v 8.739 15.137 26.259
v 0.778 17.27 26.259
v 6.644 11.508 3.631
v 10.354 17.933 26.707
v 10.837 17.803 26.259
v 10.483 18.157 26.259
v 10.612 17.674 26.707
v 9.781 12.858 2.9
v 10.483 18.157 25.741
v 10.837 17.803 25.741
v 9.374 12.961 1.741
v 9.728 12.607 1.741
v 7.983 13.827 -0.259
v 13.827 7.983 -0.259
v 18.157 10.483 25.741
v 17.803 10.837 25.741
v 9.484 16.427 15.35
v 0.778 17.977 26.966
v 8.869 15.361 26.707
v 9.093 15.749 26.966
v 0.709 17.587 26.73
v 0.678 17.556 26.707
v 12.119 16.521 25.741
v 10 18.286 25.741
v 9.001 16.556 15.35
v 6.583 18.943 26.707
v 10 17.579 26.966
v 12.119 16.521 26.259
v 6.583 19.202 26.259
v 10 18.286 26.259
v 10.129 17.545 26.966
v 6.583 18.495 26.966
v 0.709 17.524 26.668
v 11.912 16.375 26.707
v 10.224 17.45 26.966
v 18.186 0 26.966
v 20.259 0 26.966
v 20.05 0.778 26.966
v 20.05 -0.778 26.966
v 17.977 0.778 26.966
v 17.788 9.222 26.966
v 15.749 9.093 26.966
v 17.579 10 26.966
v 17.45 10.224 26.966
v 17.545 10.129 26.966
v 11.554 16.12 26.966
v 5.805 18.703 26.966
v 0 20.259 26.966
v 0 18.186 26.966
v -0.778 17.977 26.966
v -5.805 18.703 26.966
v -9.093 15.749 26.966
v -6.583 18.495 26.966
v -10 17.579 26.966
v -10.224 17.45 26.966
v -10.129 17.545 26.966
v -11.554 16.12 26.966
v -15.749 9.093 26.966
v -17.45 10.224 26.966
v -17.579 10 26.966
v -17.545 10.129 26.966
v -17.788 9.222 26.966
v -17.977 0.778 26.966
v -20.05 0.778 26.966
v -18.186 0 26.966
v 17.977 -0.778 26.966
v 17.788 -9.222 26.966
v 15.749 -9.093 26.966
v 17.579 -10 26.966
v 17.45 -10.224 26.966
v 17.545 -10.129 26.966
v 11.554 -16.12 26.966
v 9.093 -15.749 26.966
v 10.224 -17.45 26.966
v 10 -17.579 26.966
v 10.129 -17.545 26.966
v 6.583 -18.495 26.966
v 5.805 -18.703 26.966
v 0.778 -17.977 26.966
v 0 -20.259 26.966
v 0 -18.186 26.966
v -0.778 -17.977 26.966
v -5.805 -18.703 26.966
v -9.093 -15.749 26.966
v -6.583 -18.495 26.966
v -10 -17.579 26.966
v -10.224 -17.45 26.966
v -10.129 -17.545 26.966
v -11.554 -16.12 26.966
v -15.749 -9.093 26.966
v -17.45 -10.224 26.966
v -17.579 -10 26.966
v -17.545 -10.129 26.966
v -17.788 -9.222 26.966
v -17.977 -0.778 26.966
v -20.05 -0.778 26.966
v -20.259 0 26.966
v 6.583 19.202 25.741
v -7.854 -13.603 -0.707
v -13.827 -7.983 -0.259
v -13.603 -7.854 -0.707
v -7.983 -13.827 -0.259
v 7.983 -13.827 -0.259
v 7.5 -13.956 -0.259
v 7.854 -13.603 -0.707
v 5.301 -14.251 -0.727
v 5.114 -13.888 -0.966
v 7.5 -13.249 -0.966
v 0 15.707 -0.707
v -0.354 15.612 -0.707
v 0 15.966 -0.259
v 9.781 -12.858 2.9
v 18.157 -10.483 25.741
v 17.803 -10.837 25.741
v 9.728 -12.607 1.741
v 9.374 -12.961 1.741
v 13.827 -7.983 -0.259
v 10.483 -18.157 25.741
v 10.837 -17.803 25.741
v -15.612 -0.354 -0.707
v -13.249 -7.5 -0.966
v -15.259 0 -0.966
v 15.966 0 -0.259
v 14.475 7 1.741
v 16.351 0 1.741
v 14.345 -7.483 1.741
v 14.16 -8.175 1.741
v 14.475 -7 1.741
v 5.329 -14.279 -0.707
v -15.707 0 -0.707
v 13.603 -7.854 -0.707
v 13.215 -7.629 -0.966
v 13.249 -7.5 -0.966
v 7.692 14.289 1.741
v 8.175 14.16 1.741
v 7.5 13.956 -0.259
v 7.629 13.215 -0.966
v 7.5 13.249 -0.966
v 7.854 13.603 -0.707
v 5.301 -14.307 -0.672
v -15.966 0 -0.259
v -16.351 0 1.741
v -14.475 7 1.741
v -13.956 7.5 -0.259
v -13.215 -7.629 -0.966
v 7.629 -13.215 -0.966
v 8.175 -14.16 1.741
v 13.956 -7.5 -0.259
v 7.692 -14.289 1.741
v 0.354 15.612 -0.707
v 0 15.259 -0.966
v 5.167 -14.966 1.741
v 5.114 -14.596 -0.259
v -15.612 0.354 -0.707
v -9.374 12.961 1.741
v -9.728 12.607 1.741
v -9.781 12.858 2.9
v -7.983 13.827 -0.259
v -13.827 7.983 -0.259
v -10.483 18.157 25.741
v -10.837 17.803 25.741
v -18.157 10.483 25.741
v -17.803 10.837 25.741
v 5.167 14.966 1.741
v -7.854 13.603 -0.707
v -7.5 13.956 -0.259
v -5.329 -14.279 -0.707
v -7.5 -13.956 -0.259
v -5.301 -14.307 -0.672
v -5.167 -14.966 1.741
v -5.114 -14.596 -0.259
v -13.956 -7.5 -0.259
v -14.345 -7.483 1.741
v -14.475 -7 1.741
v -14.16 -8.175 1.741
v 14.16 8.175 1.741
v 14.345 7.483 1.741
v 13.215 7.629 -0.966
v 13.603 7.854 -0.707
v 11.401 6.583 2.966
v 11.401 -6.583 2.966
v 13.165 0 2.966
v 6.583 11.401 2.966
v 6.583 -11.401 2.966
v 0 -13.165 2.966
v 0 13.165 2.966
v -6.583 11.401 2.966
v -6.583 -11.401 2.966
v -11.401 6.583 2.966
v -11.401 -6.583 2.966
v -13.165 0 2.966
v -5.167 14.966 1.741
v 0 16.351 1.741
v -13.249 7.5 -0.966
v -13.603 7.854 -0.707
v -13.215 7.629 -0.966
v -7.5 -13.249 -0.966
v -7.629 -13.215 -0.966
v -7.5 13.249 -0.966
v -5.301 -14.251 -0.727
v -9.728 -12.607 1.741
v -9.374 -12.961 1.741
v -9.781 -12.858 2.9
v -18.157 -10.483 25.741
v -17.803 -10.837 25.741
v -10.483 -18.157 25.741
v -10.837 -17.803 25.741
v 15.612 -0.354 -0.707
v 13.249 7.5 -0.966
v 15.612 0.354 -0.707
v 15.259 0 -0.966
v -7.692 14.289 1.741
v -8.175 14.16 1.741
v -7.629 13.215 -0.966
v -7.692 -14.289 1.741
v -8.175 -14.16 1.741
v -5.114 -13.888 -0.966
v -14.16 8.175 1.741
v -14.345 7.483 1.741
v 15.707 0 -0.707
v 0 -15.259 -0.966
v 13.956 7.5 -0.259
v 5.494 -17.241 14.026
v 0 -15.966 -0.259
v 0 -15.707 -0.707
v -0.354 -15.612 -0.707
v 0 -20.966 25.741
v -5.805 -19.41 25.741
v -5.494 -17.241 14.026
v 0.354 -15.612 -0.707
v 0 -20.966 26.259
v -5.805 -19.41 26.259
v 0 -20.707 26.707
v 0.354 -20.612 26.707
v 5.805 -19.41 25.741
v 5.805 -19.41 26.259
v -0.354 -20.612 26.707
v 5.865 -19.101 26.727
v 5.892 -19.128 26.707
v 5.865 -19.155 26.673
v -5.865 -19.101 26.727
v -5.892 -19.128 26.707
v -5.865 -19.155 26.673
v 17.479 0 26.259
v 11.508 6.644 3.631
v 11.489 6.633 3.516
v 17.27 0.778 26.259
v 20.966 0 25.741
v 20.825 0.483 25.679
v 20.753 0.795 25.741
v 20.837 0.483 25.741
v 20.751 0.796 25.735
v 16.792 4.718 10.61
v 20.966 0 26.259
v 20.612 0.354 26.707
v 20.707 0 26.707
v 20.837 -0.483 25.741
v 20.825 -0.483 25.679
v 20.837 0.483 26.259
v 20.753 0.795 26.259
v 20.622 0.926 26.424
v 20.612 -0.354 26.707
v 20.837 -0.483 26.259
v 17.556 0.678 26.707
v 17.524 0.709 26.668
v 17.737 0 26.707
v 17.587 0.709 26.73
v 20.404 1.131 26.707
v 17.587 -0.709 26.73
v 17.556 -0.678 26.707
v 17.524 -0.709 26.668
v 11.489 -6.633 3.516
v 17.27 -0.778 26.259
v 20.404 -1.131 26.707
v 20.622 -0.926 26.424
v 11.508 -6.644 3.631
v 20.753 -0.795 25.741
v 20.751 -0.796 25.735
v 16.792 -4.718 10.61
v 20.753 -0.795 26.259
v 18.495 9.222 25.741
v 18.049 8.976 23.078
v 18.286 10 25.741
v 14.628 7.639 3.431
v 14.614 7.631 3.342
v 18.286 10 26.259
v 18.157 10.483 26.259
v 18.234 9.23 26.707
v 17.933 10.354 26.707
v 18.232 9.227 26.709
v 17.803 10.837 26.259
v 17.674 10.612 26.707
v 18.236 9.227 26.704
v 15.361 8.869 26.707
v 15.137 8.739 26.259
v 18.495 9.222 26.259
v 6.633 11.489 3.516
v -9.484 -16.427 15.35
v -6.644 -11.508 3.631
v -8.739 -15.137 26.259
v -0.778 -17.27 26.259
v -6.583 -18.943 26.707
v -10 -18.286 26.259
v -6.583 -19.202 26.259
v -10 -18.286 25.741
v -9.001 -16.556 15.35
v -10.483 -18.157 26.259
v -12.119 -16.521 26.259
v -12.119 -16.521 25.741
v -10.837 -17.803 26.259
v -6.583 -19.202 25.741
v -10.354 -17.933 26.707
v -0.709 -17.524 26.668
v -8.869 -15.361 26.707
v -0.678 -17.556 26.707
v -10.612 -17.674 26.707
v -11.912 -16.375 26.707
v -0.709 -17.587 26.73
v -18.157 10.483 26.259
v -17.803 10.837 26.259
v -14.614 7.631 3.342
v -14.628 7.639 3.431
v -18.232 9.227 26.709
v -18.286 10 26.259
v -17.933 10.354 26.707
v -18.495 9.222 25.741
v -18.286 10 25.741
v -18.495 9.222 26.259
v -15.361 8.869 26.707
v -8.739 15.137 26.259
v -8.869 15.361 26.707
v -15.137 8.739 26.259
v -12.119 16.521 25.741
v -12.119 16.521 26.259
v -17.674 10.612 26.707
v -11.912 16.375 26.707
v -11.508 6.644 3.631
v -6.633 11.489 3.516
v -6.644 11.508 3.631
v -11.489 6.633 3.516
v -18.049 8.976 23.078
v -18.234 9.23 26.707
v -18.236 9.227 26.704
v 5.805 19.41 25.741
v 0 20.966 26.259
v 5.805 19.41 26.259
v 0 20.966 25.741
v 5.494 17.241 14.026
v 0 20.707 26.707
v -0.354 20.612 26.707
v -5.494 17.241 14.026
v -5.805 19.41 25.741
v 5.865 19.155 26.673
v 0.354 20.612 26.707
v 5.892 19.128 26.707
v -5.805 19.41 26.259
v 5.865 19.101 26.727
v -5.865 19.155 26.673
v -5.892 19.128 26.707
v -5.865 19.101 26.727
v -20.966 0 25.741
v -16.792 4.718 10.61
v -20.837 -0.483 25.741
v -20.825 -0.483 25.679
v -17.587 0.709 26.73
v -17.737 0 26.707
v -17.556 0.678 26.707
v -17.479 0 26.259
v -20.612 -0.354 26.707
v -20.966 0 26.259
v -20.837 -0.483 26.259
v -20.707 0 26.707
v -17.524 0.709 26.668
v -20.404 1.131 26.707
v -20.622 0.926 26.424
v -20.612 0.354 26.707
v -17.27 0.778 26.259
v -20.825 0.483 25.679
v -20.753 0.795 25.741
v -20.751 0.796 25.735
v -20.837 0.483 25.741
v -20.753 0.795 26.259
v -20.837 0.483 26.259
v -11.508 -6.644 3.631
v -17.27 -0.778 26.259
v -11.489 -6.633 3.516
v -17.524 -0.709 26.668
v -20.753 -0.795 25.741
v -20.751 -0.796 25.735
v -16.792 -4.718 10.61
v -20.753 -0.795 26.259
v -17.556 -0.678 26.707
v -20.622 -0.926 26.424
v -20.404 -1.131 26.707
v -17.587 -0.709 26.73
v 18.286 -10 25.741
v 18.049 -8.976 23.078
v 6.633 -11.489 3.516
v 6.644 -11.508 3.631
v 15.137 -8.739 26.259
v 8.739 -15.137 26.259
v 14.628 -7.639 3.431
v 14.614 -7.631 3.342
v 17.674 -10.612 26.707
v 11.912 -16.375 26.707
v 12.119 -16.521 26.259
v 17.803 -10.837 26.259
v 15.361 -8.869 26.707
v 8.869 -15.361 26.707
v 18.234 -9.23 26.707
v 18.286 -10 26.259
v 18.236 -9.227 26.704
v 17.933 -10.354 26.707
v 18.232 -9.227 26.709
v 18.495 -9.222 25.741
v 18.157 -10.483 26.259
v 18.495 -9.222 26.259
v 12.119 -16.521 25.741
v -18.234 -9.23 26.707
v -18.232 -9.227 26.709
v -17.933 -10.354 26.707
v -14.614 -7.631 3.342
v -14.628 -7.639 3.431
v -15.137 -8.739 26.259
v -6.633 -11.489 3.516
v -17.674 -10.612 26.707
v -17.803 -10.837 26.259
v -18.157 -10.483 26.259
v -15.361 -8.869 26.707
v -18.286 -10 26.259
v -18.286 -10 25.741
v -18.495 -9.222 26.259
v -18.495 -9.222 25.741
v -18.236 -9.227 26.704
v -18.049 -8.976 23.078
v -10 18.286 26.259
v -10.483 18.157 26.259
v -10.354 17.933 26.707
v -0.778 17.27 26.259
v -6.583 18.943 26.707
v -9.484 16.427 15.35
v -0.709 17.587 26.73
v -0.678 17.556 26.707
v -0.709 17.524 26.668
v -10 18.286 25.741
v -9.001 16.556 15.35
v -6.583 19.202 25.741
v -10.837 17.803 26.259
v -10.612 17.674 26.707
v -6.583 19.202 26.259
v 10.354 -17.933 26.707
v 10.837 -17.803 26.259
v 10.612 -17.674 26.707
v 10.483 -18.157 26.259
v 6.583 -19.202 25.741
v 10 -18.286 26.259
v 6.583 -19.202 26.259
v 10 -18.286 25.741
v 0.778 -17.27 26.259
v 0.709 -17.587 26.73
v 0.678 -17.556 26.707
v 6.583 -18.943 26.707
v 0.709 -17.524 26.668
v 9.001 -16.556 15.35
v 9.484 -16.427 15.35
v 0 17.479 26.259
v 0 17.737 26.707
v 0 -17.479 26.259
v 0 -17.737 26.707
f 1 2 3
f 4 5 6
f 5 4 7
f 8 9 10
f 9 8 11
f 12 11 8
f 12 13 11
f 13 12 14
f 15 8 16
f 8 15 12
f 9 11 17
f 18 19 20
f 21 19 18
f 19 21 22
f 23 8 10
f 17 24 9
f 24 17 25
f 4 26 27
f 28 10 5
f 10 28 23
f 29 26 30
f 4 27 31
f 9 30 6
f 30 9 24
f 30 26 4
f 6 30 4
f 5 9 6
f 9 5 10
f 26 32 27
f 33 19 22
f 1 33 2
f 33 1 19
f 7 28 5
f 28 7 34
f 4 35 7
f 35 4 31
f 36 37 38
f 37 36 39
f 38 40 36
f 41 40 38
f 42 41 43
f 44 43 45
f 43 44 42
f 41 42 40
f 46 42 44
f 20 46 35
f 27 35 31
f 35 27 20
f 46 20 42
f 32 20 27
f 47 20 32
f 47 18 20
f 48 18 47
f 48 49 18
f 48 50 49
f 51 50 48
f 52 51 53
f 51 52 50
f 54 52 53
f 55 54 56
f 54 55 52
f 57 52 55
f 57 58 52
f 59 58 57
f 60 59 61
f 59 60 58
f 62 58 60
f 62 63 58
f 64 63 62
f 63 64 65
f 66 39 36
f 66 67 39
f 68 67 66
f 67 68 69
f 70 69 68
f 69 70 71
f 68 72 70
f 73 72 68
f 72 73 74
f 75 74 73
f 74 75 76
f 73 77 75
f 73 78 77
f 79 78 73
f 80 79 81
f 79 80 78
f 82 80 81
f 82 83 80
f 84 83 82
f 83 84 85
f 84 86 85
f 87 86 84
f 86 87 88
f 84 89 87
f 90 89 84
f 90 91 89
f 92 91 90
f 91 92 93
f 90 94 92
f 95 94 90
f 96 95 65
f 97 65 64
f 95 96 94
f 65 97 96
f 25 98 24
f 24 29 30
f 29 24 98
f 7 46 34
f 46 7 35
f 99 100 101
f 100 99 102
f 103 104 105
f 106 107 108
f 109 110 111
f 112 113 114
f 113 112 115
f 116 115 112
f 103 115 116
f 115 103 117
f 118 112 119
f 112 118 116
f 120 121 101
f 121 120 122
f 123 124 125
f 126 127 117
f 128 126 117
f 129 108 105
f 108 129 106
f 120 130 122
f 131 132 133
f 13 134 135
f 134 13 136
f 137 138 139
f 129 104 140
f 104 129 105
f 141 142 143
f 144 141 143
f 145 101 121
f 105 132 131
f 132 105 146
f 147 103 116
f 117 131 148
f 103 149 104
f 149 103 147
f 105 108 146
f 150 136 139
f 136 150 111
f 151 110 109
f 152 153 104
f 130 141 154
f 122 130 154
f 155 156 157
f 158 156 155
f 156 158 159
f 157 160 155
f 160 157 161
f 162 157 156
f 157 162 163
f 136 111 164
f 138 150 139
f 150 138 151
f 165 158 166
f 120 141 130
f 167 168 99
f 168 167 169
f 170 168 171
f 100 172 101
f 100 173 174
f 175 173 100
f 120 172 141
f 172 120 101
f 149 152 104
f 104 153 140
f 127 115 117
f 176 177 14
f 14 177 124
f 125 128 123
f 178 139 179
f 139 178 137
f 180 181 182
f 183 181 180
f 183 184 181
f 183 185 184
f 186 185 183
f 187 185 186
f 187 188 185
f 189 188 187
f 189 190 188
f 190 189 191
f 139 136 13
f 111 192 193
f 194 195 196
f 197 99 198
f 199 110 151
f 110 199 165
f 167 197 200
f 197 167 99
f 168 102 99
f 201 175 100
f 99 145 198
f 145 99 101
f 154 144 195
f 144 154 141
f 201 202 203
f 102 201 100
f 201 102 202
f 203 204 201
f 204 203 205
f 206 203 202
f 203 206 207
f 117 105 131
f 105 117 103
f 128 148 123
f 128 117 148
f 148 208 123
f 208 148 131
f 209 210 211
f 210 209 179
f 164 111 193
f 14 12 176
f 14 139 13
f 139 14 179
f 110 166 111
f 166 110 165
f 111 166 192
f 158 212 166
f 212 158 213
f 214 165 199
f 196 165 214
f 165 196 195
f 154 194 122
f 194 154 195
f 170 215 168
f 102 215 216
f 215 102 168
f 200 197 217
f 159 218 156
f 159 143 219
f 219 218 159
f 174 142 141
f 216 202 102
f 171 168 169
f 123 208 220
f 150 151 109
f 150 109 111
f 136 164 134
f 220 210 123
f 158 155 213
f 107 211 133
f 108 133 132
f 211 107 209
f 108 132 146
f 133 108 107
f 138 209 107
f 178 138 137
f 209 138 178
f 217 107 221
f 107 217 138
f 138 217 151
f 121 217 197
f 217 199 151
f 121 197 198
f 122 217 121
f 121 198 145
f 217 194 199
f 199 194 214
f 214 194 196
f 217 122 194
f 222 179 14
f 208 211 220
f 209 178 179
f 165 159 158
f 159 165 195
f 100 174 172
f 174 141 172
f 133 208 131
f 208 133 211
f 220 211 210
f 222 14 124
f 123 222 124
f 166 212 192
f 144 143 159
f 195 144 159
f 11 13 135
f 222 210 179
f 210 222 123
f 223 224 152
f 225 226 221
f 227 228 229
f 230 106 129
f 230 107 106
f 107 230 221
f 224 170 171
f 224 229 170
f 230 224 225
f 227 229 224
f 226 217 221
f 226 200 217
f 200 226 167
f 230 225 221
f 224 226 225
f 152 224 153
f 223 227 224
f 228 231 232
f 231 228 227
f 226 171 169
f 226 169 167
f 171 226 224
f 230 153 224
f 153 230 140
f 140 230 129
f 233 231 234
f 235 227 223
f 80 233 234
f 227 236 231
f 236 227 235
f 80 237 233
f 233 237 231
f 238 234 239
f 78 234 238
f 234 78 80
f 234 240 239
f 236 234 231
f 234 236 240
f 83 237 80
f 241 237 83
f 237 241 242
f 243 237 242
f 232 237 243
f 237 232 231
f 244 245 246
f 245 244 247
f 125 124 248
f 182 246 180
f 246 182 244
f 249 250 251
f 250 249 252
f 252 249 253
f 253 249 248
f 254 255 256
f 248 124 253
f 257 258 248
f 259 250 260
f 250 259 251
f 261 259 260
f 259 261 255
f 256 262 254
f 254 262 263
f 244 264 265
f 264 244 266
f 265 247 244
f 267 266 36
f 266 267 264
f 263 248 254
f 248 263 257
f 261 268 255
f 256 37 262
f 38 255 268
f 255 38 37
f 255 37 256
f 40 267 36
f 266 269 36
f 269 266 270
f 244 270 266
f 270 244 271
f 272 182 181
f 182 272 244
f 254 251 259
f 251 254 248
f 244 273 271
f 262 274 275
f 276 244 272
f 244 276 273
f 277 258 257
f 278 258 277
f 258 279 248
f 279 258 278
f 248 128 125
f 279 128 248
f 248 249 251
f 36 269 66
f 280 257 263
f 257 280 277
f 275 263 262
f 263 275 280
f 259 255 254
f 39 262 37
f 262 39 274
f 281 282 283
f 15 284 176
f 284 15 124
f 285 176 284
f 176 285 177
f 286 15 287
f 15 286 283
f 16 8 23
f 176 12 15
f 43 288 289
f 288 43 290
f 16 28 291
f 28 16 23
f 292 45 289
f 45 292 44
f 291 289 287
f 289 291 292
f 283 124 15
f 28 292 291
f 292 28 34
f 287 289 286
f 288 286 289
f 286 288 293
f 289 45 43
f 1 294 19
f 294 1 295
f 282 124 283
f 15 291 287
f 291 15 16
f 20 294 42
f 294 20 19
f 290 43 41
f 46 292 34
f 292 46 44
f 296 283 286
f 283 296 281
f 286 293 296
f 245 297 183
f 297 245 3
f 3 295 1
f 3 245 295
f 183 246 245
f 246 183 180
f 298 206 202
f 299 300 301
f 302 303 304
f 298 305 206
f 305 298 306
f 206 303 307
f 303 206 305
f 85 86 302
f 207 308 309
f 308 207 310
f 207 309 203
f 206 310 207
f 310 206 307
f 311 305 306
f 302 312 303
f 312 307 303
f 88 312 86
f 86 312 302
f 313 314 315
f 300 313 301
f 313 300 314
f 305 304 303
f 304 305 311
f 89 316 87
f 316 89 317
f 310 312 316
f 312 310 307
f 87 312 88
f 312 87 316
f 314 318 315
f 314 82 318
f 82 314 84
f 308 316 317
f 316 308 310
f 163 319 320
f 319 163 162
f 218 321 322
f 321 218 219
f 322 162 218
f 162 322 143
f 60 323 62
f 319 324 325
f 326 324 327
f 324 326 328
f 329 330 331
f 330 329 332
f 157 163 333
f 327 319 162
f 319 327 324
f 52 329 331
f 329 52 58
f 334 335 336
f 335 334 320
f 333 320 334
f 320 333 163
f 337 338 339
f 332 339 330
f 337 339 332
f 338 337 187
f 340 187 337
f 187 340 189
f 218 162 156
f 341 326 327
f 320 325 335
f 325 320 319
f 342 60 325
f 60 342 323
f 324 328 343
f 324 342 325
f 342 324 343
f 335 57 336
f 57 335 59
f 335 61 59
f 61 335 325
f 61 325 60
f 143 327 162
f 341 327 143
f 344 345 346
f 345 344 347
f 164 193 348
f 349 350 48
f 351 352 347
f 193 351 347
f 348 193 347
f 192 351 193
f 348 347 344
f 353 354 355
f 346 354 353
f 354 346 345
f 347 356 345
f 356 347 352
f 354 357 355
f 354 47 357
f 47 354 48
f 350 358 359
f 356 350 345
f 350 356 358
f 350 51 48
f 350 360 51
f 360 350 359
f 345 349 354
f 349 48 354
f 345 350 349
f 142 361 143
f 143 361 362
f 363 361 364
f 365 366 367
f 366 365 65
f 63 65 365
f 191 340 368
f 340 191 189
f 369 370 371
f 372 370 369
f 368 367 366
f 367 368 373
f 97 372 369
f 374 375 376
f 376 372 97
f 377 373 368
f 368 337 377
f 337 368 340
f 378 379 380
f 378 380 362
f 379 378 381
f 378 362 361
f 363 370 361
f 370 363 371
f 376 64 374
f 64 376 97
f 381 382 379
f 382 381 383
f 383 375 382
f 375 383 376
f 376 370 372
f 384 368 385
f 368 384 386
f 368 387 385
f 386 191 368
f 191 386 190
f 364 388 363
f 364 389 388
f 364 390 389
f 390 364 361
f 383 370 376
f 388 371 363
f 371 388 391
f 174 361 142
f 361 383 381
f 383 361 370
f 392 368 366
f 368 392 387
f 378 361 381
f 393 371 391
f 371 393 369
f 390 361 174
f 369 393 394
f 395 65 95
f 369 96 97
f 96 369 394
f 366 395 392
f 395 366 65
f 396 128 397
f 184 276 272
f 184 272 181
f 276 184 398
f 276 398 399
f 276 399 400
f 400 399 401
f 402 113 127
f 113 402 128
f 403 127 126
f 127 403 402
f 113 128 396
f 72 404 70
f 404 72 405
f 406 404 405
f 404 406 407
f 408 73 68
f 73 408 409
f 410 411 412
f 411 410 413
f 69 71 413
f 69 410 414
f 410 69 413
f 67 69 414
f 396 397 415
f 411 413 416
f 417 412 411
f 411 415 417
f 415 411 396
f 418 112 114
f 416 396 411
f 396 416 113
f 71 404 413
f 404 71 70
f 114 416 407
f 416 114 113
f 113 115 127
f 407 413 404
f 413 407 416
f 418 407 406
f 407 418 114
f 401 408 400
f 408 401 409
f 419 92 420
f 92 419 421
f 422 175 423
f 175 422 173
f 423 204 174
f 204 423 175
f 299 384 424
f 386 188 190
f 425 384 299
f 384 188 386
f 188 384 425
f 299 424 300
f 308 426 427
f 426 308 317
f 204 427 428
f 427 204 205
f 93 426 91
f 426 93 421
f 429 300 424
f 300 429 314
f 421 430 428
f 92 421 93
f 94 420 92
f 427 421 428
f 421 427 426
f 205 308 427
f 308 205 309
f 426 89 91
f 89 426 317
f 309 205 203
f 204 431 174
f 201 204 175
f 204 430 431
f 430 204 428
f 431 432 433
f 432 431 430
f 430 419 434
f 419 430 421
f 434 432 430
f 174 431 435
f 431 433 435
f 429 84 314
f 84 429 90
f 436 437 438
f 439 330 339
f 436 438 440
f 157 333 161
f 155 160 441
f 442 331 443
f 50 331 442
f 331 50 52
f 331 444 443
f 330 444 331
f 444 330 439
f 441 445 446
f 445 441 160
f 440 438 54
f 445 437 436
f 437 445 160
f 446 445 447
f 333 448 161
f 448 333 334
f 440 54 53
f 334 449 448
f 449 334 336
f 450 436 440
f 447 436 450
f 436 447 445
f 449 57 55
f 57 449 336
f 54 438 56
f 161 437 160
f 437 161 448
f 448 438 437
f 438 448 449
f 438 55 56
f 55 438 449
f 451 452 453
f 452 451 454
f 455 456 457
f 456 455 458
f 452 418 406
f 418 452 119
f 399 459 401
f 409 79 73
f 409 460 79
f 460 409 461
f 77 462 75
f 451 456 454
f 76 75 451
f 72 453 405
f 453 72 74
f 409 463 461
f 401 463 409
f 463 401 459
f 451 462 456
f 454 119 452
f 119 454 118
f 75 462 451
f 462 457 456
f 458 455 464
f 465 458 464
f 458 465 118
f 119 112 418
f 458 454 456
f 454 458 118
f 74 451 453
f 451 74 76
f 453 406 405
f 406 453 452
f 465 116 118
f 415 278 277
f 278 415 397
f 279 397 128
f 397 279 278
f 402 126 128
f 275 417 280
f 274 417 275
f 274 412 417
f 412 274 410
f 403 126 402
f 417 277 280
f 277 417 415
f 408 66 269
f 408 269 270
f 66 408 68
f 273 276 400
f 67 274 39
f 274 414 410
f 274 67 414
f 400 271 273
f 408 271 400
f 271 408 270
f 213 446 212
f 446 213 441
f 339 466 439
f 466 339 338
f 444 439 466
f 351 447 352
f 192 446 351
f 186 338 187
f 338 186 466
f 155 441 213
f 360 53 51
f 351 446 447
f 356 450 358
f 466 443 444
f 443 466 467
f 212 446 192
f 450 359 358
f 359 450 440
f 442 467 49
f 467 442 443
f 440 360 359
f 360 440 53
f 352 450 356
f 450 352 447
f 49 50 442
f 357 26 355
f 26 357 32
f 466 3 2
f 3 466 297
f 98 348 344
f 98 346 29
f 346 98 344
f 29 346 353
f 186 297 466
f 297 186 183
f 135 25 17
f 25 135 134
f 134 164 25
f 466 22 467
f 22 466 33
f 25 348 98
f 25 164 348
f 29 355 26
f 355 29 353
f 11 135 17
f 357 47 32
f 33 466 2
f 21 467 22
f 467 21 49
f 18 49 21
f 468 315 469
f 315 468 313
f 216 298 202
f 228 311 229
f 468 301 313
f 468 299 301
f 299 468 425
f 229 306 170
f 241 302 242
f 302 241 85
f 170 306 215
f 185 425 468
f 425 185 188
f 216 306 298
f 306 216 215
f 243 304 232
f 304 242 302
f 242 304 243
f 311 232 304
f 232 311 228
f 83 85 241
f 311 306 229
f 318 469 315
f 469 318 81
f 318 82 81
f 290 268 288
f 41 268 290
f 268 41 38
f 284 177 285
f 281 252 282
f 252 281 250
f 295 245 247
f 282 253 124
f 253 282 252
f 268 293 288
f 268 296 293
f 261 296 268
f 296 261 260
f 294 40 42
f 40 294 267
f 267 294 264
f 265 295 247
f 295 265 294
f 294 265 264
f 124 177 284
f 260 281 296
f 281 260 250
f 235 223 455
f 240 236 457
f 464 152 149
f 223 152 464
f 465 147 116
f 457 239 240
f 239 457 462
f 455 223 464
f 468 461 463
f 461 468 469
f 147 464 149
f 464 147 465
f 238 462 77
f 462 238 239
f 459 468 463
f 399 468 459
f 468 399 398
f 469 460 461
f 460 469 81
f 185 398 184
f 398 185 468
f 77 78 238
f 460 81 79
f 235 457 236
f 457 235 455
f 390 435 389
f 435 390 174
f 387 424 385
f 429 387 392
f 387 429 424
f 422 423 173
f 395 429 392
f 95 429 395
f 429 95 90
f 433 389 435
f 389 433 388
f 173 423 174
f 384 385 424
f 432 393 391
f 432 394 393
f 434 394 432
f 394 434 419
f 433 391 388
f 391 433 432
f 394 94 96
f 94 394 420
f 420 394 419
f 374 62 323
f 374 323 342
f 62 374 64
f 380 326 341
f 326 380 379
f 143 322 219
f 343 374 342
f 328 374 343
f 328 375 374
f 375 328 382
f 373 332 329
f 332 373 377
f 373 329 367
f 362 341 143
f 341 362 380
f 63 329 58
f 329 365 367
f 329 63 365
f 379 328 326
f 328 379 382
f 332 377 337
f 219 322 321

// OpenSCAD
$fn = 12;

minkowski() {
    difference() {
        cylinder(h = 26, d1 = 30, d2 = 40);
        translate([0, 0, 2]) cylinder(h = 27, d1 = 28, d2 = 38);
    }
    
    sphere(r = 1);
}
